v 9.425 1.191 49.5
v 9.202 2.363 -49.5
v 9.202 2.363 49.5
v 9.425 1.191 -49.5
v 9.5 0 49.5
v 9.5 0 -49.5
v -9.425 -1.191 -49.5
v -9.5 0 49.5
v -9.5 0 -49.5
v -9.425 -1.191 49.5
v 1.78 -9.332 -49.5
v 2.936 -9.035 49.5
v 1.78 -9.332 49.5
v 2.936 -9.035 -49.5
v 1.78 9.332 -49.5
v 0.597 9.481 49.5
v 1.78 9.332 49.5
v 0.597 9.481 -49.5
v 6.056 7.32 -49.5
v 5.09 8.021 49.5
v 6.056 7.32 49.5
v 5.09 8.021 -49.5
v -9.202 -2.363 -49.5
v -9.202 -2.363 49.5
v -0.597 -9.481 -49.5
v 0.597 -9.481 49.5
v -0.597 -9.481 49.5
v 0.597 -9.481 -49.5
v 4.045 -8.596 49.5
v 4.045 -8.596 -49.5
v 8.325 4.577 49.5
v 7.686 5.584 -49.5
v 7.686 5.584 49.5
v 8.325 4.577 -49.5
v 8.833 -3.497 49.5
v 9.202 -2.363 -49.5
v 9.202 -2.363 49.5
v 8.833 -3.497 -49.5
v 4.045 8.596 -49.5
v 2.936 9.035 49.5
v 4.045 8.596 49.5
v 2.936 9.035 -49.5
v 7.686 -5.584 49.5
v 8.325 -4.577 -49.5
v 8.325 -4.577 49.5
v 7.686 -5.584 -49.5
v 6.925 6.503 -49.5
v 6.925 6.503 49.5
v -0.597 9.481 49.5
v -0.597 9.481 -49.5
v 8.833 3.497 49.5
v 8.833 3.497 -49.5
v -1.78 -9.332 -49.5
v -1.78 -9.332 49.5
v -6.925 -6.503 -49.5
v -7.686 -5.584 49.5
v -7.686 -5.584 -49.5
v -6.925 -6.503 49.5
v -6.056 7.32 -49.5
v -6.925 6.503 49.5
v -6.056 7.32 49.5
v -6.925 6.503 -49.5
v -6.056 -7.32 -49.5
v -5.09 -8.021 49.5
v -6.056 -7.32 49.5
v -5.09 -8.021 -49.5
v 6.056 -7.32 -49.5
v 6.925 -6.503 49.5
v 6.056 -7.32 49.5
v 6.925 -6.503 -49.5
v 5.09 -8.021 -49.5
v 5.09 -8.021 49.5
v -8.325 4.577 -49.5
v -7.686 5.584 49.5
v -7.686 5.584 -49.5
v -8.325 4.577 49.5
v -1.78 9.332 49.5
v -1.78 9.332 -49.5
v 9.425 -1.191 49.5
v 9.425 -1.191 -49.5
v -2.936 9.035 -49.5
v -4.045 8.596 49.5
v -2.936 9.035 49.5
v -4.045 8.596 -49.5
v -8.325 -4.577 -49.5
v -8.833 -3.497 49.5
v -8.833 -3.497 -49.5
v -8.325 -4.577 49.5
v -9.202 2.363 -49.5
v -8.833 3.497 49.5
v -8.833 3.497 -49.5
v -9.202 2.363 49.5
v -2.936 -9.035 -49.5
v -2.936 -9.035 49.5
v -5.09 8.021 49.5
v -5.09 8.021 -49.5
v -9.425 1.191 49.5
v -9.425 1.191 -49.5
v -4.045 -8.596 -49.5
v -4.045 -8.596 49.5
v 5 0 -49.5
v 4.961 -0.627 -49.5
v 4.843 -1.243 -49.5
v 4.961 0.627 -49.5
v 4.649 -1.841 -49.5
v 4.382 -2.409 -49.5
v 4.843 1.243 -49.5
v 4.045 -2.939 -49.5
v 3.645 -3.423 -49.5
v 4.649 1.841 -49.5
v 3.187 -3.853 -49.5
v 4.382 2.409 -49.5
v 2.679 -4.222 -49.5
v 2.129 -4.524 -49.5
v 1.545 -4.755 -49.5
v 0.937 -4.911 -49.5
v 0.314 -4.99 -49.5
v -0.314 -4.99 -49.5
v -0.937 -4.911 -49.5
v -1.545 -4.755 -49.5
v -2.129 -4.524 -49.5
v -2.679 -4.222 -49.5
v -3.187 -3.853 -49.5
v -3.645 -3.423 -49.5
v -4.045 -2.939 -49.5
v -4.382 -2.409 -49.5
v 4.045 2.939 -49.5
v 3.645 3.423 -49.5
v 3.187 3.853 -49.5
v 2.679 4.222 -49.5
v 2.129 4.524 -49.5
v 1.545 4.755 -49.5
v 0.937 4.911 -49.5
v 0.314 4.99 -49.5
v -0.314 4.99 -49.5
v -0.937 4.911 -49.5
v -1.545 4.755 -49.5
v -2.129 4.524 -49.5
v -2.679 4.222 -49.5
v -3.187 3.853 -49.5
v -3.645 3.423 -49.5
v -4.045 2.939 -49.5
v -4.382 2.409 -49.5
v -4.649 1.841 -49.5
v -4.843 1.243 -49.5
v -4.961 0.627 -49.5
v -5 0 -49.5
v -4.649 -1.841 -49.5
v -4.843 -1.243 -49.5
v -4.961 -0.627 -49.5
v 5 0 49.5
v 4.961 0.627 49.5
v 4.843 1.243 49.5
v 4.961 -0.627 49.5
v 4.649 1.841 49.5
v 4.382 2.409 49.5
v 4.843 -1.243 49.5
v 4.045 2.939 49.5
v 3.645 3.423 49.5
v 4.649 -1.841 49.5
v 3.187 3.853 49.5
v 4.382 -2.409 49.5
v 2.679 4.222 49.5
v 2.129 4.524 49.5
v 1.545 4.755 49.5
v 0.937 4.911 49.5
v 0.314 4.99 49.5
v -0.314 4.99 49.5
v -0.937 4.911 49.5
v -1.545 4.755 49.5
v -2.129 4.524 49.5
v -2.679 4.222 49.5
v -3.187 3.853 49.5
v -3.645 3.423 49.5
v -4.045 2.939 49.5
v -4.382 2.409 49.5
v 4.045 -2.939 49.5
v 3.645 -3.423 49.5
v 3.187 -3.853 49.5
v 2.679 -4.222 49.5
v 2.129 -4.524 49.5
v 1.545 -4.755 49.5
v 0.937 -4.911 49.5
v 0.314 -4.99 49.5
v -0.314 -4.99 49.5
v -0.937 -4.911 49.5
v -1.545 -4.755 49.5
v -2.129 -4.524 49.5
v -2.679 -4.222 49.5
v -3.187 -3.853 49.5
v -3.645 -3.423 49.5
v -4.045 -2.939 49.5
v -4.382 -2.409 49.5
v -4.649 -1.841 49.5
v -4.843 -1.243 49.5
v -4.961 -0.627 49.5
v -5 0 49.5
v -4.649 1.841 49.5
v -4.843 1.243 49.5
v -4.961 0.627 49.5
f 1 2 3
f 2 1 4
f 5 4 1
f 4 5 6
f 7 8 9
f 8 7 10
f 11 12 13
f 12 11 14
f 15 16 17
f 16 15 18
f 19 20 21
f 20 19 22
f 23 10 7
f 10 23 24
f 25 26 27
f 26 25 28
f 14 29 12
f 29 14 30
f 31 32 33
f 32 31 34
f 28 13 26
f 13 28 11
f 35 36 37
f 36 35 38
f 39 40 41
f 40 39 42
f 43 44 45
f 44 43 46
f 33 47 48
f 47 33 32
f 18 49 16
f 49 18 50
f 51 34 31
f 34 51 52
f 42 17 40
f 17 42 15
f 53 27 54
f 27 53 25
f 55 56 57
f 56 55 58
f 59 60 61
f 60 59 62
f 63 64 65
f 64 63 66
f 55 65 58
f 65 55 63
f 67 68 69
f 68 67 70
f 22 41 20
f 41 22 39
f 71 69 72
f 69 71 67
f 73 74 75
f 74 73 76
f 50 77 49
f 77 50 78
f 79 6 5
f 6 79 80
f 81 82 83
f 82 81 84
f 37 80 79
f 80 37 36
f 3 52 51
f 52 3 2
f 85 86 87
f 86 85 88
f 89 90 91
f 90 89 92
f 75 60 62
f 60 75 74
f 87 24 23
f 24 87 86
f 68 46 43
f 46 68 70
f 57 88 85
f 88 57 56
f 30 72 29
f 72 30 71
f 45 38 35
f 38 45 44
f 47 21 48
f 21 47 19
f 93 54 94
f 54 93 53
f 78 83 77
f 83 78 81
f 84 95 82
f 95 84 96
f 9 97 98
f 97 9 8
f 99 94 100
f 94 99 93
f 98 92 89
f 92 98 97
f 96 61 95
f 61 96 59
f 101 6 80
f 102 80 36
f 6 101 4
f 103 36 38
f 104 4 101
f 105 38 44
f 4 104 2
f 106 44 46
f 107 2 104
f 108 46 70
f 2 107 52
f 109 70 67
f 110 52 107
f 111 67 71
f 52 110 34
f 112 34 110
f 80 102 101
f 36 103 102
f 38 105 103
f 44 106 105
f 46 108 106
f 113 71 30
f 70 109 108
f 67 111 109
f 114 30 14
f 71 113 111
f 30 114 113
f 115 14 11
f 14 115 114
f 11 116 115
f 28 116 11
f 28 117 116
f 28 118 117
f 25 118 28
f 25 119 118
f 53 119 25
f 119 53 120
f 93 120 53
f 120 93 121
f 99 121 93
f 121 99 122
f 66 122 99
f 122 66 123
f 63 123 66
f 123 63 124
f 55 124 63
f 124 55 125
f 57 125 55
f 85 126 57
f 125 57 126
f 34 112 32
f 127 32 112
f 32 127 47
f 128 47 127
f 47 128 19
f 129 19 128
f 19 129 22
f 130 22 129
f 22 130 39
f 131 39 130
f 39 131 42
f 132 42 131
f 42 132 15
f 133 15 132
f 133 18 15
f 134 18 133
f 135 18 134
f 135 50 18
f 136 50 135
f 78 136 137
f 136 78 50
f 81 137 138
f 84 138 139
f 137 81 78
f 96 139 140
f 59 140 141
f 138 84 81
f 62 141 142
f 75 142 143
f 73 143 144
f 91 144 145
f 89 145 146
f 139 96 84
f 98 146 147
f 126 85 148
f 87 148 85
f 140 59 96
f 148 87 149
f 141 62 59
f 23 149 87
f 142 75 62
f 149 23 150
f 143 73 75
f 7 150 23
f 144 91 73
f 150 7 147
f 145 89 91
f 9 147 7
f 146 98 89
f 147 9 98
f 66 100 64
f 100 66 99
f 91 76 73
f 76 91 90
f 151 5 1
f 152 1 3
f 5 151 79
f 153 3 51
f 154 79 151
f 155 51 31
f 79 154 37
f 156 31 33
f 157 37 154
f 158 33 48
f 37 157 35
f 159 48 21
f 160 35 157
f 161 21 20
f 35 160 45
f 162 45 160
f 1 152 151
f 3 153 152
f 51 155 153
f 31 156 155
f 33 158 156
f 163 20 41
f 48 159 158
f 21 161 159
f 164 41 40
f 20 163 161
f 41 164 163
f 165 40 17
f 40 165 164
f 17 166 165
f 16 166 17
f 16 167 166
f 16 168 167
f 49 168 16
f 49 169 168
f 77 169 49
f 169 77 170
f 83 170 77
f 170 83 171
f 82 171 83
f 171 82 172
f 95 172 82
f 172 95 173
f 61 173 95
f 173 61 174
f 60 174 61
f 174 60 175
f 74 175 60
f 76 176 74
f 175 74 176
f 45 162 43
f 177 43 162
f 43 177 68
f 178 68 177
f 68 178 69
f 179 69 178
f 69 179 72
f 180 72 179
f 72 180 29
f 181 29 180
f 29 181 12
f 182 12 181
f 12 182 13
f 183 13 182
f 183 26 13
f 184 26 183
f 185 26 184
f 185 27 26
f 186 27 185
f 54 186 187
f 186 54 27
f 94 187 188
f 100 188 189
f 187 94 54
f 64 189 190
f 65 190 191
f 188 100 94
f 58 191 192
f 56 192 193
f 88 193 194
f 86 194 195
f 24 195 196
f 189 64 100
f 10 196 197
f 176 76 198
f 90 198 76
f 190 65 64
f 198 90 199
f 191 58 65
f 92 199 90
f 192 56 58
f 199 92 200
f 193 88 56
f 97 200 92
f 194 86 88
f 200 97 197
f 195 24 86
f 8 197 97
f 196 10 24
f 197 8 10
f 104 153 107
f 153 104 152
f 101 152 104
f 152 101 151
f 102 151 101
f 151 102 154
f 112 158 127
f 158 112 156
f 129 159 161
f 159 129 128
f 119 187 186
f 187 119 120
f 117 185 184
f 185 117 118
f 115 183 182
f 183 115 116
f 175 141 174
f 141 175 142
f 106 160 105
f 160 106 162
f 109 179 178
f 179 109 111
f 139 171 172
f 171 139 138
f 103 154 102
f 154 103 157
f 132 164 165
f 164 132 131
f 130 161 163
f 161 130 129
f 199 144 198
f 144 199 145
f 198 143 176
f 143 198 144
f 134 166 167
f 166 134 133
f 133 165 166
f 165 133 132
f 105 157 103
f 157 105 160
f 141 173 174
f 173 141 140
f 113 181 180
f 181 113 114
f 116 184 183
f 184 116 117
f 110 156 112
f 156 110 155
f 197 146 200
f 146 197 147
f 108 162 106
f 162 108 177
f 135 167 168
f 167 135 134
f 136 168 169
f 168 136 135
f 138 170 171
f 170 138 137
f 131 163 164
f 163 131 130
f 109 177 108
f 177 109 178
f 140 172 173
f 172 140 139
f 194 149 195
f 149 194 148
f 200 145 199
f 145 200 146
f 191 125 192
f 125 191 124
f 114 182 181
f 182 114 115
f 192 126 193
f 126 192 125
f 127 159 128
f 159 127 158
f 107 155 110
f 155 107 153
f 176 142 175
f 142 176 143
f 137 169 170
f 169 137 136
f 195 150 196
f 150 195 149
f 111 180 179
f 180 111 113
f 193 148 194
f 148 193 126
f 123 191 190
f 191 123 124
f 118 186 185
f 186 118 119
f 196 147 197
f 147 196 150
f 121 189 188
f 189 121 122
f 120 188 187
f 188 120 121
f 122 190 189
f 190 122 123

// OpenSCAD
$fn = 50;


difference() {
	union() {
		translate(v = [0, 0, -49.5000000000]) {
			cylinder(h = 99, r = 9.5000000000);
		}
	}
	union() {
		translate(v = [0, 0, -100.0000000000]) {
			cylinder(h = 200, r = 5.0000000000);
		}
	}
}
